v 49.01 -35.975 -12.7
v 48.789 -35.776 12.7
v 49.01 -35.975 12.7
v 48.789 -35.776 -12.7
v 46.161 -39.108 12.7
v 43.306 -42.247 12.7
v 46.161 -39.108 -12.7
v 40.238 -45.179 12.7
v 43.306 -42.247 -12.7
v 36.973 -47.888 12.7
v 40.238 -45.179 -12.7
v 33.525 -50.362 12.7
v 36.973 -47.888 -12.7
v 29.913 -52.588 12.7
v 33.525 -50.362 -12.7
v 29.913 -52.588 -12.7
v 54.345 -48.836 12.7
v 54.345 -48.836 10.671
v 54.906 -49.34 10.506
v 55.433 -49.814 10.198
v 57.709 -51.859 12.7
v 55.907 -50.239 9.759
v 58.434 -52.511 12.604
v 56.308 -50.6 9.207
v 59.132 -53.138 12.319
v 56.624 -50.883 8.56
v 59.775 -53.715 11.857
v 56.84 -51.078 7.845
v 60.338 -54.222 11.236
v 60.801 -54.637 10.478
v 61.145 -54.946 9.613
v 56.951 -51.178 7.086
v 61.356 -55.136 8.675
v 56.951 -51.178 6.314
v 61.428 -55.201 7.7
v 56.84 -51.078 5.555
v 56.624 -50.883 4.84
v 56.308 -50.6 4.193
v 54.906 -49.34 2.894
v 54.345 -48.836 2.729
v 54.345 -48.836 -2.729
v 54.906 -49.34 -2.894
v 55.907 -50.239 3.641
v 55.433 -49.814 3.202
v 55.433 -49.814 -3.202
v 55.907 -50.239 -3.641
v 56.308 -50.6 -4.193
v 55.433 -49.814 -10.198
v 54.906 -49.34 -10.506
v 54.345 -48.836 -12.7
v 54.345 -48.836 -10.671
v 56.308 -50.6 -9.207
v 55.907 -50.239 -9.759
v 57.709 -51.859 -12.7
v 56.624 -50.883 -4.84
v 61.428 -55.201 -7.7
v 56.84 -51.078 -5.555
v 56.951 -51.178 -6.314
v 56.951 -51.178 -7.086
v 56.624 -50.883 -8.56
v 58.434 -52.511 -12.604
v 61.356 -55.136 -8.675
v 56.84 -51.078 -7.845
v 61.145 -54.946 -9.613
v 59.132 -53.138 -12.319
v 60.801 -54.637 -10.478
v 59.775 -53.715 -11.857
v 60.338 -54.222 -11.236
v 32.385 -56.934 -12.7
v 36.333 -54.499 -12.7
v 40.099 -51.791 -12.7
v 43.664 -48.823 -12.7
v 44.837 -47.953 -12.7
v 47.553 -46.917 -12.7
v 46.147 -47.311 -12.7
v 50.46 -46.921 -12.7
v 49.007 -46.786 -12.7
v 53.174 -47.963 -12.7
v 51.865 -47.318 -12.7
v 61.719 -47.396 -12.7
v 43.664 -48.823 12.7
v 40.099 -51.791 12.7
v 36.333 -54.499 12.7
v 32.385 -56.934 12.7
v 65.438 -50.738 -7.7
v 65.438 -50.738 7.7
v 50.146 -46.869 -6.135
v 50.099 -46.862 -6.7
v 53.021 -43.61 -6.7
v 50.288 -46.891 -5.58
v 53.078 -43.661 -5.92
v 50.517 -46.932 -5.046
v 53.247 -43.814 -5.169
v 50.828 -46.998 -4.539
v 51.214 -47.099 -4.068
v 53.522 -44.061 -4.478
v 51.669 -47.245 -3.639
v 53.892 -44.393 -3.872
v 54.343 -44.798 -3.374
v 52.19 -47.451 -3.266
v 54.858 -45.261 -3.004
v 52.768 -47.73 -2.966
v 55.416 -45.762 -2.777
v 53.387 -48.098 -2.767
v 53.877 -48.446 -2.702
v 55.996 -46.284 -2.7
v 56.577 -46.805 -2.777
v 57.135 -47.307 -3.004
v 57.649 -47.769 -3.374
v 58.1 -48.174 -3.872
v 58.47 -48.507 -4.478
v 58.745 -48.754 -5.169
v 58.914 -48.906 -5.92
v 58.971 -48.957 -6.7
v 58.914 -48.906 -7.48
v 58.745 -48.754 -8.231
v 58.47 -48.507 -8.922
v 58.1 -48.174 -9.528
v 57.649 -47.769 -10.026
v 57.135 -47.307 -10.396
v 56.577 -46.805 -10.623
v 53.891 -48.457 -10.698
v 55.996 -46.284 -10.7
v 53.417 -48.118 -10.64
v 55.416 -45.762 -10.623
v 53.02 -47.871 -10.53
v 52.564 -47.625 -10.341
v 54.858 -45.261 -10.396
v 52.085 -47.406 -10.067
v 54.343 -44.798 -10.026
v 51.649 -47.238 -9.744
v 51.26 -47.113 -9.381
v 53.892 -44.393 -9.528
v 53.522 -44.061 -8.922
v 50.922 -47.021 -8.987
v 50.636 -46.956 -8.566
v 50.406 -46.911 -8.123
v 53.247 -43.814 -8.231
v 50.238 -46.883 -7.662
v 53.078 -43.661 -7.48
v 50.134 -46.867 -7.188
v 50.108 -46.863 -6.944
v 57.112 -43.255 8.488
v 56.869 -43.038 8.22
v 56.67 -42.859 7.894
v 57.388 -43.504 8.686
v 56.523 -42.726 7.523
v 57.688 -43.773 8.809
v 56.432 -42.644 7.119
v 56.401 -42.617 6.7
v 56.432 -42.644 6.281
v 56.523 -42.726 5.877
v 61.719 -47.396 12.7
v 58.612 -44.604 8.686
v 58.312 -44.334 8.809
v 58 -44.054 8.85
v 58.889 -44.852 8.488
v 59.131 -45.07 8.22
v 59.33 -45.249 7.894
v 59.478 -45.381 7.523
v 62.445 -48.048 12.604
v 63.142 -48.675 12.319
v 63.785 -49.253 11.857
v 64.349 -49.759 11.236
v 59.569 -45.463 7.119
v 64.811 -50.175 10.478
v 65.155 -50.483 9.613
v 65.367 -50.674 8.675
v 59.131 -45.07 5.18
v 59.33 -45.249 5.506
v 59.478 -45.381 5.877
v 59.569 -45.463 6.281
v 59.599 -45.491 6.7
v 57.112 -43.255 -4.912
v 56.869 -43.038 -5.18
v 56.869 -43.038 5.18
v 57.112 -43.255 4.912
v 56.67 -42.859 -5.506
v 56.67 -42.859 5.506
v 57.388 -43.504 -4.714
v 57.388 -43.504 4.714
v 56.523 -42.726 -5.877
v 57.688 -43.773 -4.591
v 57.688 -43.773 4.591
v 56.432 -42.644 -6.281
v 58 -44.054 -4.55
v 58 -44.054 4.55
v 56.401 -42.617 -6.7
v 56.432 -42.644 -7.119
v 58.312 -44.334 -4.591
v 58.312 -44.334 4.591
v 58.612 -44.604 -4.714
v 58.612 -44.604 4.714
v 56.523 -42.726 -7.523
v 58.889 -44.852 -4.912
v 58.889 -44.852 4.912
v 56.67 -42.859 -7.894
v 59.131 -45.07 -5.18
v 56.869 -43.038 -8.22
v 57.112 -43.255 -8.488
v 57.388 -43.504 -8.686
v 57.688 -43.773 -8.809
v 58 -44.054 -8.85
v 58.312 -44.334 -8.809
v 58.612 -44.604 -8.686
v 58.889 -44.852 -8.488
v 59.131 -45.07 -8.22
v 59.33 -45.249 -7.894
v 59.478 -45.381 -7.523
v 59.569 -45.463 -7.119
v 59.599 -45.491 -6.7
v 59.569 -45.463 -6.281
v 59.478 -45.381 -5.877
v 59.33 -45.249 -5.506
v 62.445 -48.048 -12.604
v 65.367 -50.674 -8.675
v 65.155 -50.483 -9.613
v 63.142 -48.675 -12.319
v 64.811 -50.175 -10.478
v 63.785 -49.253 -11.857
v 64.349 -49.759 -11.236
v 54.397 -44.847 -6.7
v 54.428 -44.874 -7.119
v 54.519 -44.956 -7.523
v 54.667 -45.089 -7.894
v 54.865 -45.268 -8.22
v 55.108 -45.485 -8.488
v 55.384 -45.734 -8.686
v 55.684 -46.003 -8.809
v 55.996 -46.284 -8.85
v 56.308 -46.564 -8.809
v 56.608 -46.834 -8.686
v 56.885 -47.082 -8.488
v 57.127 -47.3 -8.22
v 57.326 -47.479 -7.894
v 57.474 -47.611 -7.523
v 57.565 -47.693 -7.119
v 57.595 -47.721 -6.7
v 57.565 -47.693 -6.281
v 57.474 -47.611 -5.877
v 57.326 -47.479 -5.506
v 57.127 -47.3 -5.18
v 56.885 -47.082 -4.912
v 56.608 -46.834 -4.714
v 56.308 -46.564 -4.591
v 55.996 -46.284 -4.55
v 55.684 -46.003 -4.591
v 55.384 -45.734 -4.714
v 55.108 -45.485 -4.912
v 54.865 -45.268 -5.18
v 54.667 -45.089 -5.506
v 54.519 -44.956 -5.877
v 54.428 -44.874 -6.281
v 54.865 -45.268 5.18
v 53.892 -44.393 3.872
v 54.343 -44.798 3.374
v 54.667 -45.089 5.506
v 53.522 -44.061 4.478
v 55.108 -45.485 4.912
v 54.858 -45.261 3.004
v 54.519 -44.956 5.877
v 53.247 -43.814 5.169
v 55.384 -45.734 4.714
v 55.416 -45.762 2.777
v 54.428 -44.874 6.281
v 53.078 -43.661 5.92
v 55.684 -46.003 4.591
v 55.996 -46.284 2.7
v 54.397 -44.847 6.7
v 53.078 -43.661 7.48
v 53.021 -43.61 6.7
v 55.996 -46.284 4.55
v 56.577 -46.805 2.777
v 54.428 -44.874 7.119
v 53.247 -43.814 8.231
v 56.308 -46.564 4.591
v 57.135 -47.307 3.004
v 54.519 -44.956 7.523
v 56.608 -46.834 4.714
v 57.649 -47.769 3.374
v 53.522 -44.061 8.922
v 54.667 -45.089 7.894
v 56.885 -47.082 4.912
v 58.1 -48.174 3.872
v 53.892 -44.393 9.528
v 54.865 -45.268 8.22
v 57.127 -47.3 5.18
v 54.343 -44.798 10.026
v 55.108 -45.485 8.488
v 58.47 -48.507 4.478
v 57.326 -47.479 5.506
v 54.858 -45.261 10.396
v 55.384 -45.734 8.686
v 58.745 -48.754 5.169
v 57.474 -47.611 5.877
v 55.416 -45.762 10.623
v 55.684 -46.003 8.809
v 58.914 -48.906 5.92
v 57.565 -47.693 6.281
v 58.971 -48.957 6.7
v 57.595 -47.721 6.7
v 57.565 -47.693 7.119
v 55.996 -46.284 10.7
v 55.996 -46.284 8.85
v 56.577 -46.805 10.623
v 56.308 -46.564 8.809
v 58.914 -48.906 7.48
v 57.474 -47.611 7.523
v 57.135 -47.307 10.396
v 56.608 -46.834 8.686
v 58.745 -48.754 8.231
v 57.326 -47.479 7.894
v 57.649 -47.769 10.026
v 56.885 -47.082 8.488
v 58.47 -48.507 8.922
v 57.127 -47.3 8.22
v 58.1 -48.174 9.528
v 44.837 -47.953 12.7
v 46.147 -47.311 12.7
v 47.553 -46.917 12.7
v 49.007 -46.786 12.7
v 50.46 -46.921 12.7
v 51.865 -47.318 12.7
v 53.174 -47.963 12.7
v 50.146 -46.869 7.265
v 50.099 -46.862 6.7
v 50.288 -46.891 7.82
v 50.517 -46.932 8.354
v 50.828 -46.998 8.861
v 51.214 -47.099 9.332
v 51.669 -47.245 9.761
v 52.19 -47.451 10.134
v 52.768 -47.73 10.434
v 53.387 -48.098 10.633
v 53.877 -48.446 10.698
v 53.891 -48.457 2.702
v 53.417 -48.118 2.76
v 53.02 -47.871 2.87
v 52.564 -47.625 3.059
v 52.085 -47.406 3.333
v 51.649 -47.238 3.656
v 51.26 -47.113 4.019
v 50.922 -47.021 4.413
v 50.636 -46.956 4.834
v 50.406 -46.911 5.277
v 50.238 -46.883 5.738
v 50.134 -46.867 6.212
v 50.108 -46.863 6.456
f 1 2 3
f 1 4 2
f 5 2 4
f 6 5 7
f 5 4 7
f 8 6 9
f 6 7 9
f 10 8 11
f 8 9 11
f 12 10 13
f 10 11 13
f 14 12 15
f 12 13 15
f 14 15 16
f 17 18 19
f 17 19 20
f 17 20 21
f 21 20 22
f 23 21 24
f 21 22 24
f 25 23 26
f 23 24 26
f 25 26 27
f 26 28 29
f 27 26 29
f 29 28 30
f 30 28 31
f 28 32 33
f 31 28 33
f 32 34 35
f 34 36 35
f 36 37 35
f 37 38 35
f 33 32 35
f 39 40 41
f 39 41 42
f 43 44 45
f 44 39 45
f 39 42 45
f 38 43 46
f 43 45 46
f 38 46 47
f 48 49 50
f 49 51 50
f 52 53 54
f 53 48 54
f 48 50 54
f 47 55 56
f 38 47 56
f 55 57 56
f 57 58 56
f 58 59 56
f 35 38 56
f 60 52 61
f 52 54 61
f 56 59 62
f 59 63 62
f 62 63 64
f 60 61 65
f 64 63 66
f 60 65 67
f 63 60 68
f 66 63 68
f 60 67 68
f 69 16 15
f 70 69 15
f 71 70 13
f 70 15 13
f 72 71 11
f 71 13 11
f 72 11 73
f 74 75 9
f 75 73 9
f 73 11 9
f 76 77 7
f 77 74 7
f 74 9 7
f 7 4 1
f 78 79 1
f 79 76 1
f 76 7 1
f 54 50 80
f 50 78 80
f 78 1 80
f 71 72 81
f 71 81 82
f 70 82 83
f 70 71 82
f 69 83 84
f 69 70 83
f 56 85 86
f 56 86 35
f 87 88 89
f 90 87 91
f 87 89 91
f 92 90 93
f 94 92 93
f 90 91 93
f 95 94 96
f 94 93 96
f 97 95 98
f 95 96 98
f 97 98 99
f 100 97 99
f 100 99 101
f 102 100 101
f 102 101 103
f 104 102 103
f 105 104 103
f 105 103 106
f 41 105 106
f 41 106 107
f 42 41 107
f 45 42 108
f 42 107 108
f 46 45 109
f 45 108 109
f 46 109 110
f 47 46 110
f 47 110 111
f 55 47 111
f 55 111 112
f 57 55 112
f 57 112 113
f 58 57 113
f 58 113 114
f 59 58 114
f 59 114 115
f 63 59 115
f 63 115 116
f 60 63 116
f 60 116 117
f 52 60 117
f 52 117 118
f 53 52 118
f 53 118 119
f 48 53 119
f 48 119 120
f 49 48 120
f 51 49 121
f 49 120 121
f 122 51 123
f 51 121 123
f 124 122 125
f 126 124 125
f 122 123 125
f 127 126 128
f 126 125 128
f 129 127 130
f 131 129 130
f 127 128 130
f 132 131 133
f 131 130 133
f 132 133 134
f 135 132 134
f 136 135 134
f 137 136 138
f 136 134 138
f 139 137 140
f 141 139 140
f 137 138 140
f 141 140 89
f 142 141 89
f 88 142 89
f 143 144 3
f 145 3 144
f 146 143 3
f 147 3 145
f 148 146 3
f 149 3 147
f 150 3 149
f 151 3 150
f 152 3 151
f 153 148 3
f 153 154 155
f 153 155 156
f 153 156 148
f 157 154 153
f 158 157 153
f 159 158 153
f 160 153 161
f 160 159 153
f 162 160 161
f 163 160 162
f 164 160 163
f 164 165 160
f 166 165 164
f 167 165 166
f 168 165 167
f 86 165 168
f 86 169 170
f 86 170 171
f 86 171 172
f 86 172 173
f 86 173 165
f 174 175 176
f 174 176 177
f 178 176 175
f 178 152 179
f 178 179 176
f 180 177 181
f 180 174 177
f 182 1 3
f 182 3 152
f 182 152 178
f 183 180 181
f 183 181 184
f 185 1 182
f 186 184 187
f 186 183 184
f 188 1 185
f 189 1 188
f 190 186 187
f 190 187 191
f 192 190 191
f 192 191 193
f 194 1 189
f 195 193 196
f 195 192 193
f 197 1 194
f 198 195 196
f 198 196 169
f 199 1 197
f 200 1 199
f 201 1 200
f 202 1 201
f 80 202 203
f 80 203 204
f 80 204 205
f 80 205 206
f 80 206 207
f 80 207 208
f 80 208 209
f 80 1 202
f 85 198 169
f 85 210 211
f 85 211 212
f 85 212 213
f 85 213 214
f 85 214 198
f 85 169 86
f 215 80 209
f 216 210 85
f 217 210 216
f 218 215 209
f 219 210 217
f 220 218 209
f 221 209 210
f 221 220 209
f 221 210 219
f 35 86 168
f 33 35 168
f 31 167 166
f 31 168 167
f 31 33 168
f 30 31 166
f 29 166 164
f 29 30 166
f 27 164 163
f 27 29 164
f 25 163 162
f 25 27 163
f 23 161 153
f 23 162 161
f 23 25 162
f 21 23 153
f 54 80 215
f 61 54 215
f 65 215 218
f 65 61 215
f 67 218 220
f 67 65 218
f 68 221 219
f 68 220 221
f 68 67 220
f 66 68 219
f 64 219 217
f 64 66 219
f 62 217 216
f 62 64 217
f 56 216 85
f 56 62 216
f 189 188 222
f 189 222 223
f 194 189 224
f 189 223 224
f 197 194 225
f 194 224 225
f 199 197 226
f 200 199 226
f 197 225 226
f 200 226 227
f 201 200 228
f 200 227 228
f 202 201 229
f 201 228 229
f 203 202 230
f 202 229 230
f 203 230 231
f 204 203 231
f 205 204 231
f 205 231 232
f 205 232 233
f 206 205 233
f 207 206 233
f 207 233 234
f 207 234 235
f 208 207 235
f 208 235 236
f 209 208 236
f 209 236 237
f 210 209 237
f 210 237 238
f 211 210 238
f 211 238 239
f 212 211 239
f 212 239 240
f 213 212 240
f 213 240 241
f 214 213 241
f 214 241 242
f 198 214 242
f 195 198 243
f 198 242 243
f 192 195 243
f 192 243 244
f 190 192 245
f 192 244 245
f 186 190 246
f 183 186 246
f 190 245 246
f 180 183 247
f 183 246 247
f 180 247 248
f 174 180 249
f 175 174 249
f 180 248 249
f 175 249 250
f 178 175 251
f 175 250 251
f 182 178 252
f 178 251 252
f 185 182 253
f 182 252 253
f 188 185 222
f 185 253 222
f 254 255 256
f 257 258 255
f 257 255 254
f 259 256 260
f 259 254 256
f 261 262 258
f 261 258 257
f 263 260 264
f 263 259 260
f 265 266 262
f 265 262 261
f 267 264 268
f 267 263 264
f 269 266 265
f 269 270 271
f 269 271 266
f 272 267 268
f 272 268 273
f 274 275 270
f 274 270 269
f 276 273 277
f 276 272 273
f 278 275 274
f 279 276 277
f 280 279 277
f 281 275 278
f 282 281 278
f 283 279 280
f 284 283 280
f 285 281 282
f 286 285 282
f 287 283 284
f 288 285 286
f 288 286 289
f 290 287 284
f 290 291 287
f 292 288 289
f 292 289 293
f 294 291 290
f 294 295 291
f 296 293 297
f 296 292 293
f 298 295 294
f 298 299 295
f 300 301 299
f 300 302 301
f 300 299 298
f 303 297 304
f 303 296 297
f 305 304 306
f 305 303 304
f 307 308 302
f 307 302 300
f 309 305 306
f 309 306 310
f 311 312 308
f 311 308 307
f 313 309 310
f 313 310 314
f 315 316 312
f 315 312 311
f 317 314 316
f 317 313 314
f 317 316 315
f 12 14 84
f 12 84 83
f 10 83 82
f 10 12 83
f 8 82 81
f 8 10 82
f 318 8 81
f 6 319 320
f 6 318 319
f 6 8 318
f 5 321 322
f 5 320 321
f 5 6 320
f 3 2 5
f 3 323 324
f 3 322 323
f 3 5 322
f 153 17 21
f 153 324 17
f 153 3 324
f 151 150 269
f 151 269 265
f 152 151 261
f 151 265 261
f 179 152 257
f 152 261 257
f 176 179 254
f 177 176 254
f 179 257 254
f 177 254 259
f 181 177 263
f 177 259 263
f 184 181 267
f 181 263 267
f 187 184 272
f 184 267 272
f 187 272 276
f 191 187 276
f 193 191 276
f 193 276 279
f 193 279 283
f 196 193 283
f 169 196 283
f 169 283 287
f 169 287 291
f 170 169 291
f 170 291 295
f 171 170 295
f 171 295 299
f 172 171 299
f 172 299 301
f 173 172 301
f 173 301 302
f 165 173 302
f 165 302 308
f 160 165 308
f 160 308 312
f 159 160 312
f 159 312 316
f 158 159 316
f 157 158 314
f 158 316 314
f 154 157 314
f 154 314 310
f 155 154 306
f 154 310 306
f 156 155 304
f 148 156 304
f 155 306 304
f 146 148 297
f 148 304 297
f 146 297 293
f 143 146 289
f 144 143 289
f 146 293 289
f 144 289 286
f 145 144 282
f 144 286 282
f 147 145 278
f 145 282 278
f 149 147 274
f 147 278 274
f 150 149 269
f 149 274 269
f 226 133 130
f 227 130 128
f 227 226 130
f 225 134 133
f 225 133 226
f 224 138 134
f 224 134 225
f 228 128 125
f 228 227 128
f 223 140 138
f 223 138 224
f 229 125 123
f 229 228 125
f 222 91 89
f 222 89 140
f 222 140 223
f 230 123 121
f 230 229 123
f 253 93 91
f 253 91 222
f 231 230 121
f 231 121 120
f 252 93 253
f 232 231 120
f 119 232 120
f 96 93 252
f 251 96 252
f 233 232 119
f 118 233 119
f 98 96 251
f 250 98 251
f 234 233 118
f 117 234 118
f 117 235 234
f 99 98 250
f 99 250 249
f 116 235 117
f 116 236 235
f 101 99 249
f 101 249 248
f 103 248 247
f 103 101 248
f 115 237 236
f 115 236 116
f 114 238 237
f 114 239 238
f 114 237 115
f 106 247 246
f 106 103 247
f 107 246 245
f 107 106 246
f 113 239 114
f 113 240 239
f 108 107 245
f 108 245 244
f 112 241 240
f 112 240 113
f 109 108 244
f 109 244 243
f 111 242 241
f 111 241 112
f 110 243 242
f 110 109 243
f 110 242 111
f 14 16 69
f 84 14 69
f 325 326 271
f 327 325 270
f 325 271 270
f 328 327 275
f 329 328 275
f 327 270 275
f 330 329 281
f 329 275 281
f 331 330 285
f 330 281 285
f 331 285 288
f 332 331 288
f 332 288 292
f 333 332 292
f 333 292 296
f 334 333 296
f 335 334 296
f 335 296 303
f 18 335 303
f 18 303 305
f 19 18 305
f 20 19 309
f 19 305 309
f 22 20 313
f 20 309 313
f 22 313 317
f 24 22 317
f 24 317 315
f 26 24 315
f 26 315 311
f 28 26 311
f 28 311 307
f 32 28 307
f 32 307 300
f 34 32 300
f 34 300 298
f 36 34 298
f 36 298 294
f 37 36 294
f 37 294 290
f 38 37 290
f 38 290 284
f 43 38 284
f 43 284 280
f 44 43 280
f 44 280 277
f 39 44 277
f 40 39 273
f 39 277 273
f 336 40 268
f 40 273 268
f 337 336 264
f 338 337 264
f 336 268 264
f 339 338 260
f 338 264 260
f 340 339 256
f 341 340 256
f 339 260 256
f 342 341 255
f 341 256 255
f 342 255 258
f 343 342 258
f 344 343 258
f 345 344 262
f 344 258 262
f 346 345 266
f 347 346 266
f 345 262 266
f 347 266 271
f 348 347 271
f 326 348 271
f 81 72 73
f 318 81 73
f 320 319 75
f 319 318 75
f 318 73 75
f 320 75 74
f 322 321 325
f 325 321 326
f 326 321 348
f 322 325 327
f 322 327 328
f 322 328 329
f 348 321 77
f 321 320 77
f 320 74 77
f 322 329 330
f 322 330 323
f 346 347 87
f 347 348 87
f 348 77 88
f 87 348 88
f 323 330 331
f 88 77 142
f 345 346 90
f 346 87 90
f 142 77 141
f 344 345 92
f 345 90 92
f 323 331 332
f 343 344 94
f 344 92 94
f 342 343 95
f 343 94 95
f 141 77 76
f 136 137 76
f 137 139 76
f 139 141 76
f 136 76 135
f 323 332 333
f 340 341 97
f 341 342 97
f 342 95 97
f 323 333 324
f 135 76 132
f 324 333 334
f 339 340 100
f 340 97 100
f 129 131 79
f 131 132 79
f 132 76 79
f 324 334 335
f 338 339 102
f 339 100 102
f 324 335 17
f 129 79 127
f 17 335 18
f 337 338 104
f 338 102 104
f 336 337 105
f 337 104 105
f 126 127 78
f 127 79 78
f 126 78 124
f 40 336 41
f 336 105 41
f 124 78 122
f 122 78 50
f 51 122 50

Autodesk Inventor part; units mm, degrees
ref_plane "YZ Plane" through (0, 0, 0) normal (1, 0, 0) x (0, 1, 0)
ref_plane "XZ Plane" through (0, 0, 0) normal (0, 1, 0) x (-1, 0, 0)
ref_plane "XY Plane" through (0, 0, 0) normal (0, 0, 1) x (1, 0, 0)
sketch "Sketch1" plane through (0, 0, 0) normal (0, 0, 1) x (1, 0, 0)
  circle A0 centre (0, 0) radius 57.5
  circle A1 centre (0, 0) radius 60.5
  line L0 (0, 0) -> (-45, -40.4382)
  line L1 (0, 0) -> (0, 20.5864)
  line L2 (0, 0) -> (45, -40.4382)
  circle A2 centre (0, 0) radius 65.5
  line L3 (-45, -40.4382) -> (-48.719, -43.7802)
  line L4 (45, -40.4382) -> (48.719, -43.7802)
  line L5 (-4.7542, 3.7944) -> (-49.0104, -35.9754)
  line L6 (-49.0104, -35.9754) -> (-65.4381, -50.7378)
  line L7 (-48.719, -43.7802) -> (-61.4277, -55.2006)
  line L8 (-65.4381, -50.7378) -> (-61.4277, -55.2006)
  arc A3 (-43.6644, -48.8229) -> (-54.3446, -48.8356) centre (-48.9974, -54.786) ccw
  line L9 (49.0104, -35.9754) -> (65.4381, -50.7378)
  line L10 (48.719, -43.7802) -> (61.4277, -55.2006)
  line L11 (65.4381, -50.7378) -> (61.4277, -55.2006)
  arc A4 (54.3446, -48.8356) -> (43.6644, -48.8229) centre (48.9974, -54.786) ccw
  line L12 (4.7542, 3.7944) -> (49.0104, -35.9754)
  point P0 (45, -40.4382)
  point P1 (42.7686, -38.433)
  point P2 (-42.7686, -38.433)
  point P3 (-46.5455, -33.7604)
  point P4 (52.5246, -39.1333)
  point P5 (43.6644, -48.8229)
  point P6 (-48.7886, -35.7761)
  point P7 (48.7886, -35.7761)
  dimension "d0" = 115
  dimension "d1" = 3
  dimension "d2" = 90
  dimension "d5" = 5
  dimension "d6" = 6
  dimension "d7" = 25.4
  dimension "d8" = 8
extrude "Extrusion1" add sketch "Sketch1" along normal mid plane 25.4 contours A1 L3 A2 L6 L5 | L12 L9 A2 L4 A1 | A1 L4 A2 L3 | L7 L8 L6 A2 | A2 A3 L7 | L10 A4 A2 | A2 L9 L11 L10
fillet "Fillet1" radius 5 4 edges at (-63.4329, -52.9692, 12.7) (-63.4329, -52.9692, -12.7) (63.4329, -52.9692, 12.7) (63.4329, -52.9692, -12.7)
sketch "Sketch2" plane through (-54.3446, -48.8356, -12.7) normal (0.6684, -0.7438, 0) x (0.7438, 0.6684, 0)
  arc A0 (-9.5228, 5) -> (-4.5228, 0) centre (-4.5228, 5) ccw projected
  line L0 (0, 0) -> (-4.5228, 0) projected
  line L1 (0, 0) -> (0, 25.4) projected
  line L2 (-4.5228, 25.4) -> (0, 25.4) projected
  arc A1 (-4.5228, 25.4) -> (-9.5228, 20.4) centre (-4.5228, 20.4) ccw projected
  line L3 (-9.5228, 5) -> (-9.5228, 20.4) projected
  line L4 (7.9525, 0) -> (7.9525, 25.4) projected
  line L5 (0, 25.4) -> (7.9525, 25.4) projected
  line L6 (0, 0) -> (0, 25.4) projected
  line L7 (7.9525, 0) -> (0, 0) projected
  circle A2 centre (0.4772, 19.4) radius 2.15
  line L8 (-9.5228, 12.7) -> (-3.8871, 12.7)
  circle A3 centre (0.4772, 6) radius 2.15
  point P0 (73.0633, 12.7)
  point P1 (0, 21.4964)
  point P2 (0, 17.3036)
  dimension "d10" = 4.3
  dimension "d11" = 10
  dimension "d17" = 6
extrude "Extrusion2" cut sketch "Sketch2" along normal through all both and the other way through all contours A3 L1 | L1 A3 | A2 L1 | L1 A2
sketch "Sketch3" plane through (-61.4277, -55.2006, -7.7) normal (0.6684, -0.7438, 0) x (0.7438, 0.6684, 0)
  arc A0 (9.5228, 16.4964) -> (9.5228, 12.3036) centre (10, 14.4) ccw projected
  line L0 (9.5228, 16.4964) -> (9.5228, 20.4) projected
  line L1 (5, 20.4) -> (9.5228, 20.4) projected
  arc A1 (5, 20.4) -> (0, 15.4) centre (5, 15.4) ccw projected
  line L2 (0, 0) -> (0, 15.4) projected
  arc A2 (0, 0) -> (5, -5) centre (5, 0) ccw projected
  line L3 (9.5228, -5) -> (5, -5) projected
  line L4 (9.5228, -5) -> (9.5228, -1.0964) projected
  circle A3 centre (10, 14.4) radius 4
  arc A4 (9.5228, 3.0964) -> (9.5228, -1.0964) centre (10, 1) ccw projected
  line L5 (9.5228, 3.0964) -> (9.5228, 12.3036) projected
  circle A5 centre (10, 1) radius 4
  point P0 (82.5861, 7.7)
  dimension "d14" = 8
extrude "Extrusion3" cut sketch "Sketch3" along normal mid plane 6 contours L0 A3 L5 A0 | A0 L5 A3 L0 | A5 L4 A4 L5 | L5 A4 L4 A5
mirror "Mirror2" about plane through (0, 0, 0) normal (1, 0, 0) of "Extrusion3", "Extrusion2"
sketch "Sketch4" plane through (0, 0, 12.7) normal (0, 0, 1) x (1, 0, 0)
  line L0 (61.7191, -47.3958) -> (57.7087, -51.8586) projected
  line L1 (61.7191, -47.3958) -> (48.7886, -35.7761) projected
  arc A0 (-48.7886, -35.7761) -> (48.7886, -35.7761) centre (0, 0) ccw projected
  line L2 (-48.7886, -35.7761) -> (-61.7191, -47.3958) projected
  line L3 (-57.7087, -51.8586) -> (-61.7191, -47.3958) projected
  line L4 (-57.7087, -51.8586) -> (-54.3446, -48.8356) projected
  arc A1 (-43.6644, -48.8229) -> (-54.3446, -48.8356) centre (-48.9974, -54.786) ccw projected
  arc A2 (-43.6644, -48.8229) -> (43.6644, -48.8229) centre (0, 0) ccw projected
  arc A3 (54.3446, -48.8356) -> (43.6644, -48.8229) centre (48.9974, -54.786) ccw projected
  line L5 (54.3446, -48.8356) -> (57.7087, -51.8586) projected
  line L6 (29.9128, -52.5878) -> (32.3849, -56.9339)
  line L7 (-61.4277, -55.2006) -> (-57.7087, -51.8586) projected
  line L8 (-57.7087, -51.8586) -> (-61.7191, -47.3958) projected
  line L9 (-61.7191, -47.3958) -> (-65.4381, -50.7378) projected
  line L10 (-65.4381, -50.7378) -> (-61.4277, -55.2006) projected
extrude "Extrusion4" cut sketch "Sketch4" against normal through all contours L6 A2 A1 L4 L3 L2 A0 | L3 L7 L10 L9
properties part number "CANALETA_MOVIL" material "Steel, Mild, Welded"
